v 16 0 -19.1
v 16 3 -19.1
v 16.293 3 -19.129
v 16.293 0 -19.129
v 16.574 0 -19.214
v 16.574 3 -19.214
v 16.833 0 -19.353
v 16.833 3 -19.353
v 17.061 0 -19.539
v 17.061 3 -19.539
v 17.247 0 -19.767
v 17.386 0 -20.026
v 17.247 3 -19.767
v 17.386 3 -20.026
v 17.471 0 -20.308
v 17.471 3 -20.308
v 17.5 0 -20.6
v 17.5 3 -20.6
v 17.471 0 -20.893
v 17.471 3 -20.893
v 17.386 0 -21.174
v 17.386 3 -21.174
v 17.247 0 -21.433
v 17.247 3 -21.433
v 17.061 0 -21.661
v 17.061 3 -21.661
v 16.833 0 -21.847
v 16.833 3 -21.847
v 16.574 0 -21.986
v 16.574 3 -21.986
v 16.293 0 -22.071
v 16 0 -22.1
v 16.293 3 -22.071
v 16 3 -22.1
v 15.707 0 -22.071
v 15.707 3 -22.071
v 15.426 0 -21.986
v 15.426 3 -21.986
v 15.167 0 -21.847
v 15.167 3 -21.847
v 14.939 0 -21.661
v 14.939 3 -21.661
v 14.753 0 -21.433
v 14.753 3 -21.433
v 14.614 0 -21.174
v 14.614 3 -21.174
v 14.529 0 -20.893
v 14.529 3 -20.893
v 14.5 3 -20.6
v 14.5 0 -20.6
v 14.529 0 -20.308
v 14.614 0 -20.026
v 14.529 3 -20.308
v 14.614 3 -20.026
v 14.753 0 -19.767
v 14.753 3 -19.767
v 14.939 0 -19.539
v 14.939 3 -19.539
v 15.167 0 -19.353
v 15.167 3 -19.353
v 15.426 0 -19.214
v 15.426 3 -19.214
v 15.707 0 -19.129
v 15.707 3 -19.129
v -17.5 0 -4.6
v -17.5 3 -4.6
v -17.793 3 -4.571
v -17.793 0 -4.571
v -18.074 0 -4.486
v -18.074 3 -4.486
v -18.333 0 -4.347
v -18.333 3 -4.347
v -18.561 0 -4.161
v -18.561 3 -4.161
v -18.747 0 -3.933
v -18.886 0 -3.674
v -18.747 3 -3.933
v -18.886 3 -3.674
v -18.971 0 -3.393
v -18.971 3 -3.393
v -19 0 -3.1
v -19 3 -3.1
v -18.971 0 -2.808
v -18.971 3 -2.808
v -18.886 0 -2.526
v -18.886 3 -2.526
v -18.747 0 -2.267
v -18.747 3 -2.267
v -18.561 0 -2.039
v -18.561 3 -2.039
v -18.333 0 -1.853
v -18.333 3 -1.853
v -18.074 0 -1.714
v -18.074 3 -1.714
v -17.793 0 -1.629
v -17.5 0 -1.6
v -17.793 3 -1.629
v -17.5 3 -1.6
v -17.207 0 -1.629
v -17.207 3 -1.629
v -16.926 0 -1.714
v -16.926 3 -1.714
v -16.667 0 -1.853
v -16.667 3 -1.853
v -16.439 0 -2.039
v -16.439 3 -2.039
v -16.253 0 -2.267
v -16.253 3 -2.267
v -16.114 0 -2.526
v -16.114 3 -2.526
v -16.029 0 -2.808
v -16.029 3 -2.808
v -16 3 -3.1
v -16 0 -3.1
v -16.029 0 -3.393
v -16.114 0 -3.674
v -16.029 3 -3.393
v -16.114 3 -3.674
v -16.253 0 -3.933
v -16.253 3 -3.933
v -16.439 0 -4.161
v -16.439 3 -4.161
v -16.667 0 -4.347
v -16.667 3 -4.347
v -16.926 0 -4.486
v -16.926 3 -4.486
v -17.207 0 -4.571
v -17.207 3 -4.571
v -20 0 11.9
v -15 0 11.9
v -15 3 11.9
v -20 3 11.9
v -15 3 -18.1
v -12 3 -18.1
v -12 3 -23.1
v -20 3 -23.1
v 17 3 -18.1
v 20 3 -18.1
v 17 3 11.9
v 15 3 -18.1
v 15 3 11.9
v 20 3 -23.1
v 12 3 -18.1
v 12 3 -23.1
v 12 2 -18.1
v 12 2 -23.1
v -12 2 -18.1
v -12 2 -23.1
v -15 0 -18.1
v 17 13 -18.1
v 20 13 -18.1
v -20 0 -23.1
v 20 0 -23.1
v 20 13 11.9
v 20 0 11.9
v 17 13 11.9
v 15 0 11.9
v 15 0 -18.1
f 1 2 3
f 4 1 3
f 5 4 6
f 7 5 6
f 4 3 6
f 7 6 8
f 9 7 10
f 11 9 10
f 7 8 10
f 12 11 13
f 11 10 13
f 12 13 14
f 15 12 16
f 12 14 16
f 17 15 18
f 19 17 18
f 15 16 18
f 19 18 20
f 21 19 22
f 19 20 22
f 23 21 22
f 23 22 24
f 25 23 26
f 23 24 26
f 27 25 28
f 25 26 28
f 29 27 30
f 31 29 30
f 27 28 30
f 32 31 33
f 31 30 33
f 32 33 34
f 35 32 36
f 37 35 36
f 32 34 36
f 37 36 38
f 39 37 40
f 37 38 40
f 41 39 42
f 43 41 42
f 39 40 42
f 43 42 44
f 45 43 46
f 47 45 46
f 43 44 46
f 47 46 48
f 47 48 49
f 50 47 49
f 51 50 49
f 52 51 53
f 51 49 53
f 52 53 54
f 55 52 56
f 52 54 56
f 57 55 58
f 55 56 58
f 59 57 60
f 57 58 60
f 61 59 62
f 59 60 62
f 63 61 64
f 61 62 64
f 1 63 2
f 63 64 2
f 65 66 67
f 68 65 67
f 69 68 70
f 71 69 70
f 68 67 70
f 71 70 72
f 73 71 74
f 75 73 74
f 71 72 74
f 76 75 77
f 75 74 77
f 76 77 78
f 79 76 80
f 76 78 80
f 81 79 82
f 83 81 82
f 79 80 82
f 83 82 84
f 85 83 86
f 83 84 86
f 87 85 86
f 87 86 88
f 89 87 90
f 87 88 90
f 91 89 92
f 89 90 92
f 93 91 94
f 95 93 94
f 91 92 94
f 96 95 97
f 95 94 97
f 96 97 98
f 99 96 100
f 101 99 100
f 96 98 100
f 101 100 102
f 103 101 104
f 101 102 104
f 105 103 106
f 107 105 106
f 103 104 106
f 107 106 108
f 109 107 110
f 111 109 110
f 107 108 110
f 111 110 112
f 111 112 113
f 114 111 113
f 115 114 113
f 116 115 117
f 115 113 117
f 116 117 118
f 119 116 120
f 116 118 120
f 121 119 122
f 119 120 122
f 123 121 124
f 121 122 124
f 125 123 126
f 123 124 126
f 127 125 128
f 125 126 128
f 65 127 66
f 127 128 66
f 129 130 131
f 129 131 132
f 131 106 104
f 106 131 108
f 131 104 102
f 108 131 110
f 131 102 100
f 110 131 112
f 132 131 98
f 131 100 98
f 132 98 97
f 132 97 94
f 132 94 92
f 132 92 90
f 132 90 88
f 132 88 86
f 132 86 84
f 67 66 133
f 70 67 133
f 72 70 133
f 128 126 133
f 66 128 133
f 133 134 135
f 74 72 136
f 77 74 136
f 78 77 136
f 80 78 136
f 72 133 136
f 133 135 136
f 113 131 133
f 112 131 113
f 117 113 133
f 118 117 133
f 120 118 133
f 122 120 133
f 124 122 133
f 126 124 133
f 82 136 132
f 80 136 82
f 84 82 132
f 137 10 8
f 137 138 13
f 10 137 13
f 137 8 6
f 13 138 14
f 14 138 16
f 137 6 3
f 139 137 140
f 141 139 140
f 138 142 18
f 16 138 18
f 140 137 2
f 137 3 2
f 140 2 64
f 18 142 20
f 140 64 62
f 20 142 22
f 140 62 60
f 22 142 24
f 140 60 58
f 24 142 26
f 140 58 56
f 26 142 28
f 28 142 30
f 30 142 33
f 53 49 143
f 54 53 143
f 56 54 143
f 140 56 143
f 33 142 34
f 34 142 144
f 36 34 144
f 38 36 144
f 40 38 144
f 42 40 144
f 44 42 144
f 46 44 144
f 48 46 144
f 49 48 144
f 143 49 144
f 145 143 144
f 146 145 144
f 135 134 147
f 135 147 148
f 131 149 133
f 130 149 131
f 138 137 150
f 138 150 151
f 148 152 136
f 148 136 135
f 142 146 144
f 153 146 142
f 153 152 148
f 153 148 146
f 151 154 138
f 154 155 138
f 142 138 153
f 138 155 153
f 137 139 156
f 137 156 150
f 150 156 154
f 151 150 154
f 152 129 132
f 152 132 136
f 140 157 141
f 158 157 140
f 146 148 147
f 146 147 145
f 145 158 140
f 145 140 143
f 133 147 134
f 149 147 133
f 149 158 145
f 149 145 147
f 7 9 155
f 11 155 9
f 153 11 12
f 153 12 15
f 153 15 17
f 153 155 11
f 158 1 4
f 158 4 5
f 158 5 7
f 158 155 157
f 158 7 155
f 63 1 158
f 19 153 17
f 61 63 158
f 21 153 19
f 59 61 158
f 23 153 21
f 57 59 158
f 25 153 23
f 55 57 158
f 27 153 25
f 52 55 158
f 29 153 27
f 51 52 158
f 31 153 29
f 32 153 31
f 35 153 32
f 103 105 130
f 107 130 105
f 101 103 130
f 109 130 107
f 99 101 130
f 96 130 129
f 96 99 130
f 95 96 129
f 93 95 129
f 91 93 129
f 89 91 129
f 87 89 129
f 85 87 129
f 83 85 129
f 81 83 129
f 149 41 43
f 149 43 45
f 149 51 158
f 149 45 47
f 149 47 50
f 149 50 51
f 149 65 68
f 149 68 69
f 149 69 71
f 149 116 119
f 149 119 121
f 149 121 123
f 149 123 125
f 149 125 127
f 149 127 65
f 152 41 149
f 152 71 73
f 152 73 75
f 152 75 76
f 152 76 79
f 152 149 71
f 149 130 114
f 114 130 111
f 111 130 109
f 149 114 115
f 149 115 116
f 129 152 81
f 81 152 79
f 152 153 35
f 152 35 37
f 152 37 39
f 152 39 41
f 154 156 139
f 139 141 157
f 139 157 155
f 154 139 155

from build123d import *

# Parameters (mm, degrees)
BOSS_EXTRUDE1_DEPTH = 3
SKETCH2_R           = 1.5
CUT_EXTRUDE1_DEPTH  = 3
SKETCH3_W           = 24
SKETCH3_H           = 5
CUT_EXTRUDE2_DEPTH  = 1
SKETCH4_W           = 3
SKETCH4_H           = 30
BOSS_EXTRUDE2_DEPTH = 10
SKETCH5_R           = 1.5
CUT_EXTRUDE3_DEPTH  = 3


with BuildPart() as part:
    # Sketch1 → Boss-Extrude1 (new body)
    with BuildSketch(Plane(origin=(0, 0, 0), x_dir=(1, 0, 0), z_dir=(0, 1, 0))):
        Polygon((20, -11.899861304), (15, -11.899861304), (15, 18.100138696), (-15, 18.100138696), (-15, -11.899861304), (-20, -11.899861304), (-20, 23.100138696), (20, 23.100138696), align=None)
    extrude(amount=BOSS_EXTRUDE1_DEPTH)

    # Sketch2 → Cut-Extrude1 (cut)
    with BuildSketch(Plane(origin=(0, 3, 0), x_dir=(1, 0, 0), z_dir=(0, 1, 0))):
        with Locations(Location((-17.5, 3.100138696, 0), (0, 0, 90))):
            Circle(SKETCH2_R)
    extrude(amount=-CUT_EXTRUDE1_DEPTH, mode=Mode.SUBTRACT)

    # Sketch3 → Cut-Extrude2 (cut)
    with BuildSketch(Plane(origin=(0, 3, 0), x_dir=(1, 0, 0), z_dir=(0, 1, 0))):
        with Locations((0, 20.600138696)):
            Rectangle(SKETCH3_W, SKETCH3_H)
    extrude(amount=-CUT_EXTRUDE2_DEPTH, mode=Mode.SUBTRACT)

    # Sketch4 → Boss-Extrude2 (add)
    with BuildSketch(Plane(origin=(0, 3, 0), x_dir=(1, 0, 0), z_dir=(0, 1, 0))):
        with Locations((18.5, 3.100138696)):
            Rectangle(SKETCH4_W, SKETCH4_H)
    extrude(amount=BOSS_EXTRUDE2_DEPTH)

    # Sketch5 → Cut-Extrude3 (cut)
    with BuildSketch(Plane(origin=(0, 3, 0), x_dir=(1, 0, 0), z_dir=(0, 1, 0))):
        with Locations(Location((16, 20.600138696, 0), (0, 0, 270))):
            Circle(SKETCH5_R)
    extrude(amount=-CUT_EXTRUDE3_DEPTH, mode=Mode.SUBTRACT)


solid = part.part
